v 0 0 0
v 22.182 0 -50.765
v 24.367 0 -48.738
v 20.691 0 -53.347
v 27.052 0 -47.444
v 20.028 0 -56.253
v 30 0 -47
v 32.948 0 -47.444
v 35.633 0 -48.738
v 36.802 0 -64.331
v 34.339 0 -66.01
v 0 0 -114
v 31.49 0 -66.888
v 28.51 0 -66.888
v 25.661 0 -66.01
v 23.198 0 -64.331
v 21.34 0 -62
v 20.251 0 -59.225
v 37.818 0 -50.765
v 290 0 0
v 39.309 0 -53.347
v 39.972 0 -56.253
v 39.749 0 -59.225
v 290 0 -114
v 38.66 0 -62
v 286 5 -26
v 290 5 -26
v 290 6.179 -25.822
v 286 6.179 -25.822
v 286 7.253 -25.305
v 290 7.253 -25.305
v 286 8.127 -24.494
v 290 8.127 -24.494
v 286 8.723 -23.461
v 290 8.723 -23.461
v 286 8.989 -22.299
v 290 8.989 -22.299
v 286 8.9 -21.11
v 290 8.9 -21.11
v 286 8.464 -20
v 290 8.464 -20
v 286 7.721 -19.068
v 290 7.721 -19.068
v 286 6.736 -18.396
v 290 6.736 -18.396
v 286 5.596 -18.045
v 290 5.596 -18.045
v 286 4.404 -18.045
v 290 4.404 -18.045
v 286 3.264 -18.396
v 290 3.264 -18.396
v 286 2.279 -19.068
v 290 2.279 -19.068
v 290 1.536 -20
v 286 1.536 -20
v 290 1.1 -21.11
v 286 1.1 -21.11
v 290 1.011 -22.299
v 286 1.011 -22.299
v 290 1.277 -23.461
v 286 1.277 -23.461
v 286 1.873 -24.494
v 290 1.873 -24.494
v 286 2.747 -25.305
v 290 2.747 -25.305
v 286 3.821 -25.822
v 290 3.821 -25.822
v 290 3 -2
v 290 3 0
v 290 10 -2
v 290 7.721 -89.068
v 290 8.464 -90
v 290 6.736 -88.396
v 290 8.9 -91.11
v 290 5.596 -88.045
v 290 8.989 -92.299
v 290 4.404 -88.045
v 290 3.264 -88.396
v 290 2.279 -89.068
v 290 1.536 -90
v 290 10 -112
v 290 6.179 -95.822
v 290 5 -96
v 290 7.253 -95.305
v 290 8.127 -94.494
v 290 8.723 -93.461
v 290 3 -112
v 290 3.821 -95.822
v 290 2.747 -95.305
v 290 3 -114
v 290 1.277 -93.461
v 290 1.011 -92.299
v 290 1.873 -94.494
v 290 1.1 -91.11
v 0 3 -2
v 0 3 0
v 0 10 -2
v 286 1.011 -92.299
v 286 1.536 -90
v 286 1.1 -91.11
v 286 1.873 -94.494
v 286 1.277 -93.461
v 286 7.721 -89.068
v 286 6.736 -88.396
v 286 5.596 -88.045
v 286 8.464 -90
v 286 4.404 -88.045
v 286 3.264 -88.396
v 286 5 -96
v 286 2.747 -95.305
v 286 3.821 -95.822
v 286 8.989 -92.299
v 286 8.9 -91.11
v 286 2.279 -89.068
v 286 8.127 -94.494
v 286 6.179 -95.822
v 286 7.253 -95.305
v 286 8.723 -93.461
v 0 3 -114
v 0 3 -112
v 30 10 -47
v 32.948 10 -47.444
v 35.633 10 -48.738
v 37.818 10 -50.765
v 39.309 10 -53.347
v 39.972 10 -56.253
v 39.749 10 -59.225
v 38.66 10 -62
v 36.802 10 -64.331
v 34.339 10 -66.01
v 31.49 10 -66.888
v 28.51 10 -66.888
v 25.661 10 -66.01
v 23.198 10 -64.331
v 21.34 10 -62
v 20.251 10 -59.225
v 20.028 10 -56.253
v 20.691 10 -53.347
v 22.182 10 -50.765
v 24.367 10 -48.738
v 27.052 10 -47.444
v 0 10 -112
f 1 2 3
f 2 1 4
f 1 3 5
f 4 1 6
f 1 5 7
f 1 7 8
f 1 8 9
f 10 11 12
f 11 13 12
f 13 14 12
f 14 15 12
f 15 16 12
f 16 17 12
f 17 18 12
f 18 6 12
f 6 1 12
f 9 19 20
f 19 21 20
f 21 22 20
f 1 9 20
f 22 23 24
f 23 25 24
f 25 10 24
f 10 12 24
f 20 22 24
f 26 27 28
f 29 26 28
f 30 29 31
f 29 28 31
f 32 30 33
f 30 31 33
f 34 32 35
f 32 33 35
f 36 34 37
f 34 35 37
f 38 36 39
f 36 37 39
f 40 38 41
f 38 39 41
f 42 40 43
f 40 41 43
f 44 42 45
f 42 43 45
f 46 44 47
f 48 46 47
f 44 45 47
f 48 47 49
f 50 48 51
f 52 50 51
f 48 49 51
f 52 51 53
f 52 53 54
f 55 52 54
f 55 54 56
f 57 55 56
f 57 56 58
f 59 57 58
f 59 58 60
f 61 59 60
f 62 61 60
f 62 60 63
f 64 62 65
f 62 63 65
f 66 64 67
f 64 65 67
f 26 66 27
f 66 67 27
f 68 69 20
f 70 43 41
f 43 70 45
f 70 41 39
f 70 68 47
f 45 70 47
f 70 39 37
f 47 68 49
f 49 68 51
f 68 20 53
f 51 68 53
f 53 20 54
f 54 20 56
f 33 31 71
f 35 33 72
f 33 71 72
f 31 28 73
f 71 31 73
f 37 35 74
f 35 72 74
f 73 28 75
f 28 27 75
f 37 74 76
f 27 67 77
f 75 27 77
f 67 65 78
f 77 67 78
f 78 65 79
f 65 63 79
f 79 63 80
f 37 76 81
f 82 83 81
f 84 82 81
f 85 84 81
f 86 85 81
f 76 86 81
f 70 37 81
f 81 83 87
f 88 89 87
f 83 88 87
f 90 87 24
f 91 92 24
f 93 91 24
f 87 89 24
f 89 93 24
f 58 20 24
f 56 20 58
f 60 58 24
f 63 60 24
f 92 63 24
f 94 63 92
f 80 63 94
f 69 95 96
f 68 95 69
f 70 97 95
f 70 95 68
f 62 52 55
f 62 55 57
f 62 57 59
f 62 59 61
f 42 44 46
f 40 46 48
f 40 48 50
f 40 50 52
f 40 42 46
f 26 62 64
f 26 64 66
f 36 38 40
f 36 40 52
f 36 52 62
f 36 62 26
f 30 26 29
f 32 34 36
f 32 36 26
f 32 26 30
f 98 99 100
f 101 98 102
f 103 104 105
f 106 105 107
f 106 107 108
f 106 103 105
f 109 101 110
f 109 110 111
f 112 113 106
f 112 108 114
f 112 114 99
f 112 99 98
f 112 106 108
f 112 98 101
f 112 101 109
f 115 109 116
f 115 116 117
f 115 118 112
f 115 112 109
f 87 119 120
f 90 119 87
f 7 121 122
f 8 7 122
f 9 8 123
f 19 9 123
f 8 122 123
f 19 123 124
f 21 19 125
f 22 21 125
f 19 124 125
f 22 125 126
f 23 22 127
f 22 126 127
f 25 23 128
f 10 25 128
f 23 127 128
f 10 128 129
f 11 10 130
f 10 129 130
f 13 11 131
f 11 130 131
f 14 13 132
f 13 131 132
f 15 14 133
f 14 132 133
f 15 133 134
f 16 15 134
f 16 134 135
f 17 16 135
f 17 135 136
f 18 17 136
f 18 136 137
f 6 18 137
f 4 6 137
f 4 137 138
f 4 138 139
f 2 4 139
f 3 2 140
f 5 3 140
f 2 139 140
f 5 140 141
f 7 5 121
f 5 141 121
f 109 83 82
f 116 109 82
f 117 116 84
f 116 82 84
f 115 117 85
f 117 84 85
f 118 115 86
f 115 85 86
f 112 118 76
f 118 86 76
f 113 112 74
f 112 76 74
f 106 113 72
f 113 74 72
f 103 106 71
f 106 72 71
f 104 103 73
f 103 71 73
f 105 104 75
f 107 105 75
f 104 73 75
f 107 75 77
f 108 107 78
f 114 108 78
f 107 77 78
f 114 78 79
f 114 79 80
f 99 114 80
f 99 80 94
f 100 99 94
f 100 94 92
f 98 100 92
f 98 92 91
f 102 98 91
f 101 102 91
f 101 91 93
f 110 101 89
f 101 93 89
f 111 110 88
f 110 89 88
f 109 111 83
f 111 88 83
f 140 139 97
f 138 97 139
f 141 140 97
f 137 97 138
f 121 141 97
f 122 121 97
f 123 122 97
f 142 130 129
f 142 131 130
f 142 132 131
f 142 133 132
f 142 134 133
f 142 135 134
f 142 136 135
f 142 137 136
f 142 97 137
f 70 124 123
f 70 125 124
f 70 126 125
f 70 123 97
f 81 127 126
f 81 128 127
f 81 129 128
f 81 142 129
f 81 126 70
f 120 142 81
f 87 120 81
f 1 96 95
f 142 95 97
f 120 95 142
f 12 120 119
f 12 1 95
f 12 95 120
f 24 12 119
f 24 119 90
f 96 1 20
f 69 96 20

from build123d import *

# Parameters (mm, degrees)
SKETCH1_W           = 290
SKETCH1_H           = 114
BOSS_EXTRUDE1_DEPTH = 10
SKETCH2_W           = 290
SKETCH2_H           = 2
CUT_EXTRUDE1_DEPTH  = 7
SKETCH3_R           = 4
CUT_EXTRUDE2_DEPTH  = 4
SKETCH4_R           = 10
CUT_EXTRUDE3_DEPTH  = 10


with BuildPart() as part:
    # Sketch1 → Boss-Extrude1 (new body)
    with BuildSketch(Plane(origin=(0, 0, 0), x_dir=(1, 0, 0), z_dir=(0, 1, 0))):
        with Locations((145, 57)):
            Rectangle(SKETCH1_W, SKETCH1_H)
    extrude(amount=BOSS_EXTRUDE1_DEPTH)

    # Sketch2 → Cut-Extrude1 (cut)
    with BuildSketch(Plane(origin=(0, 10, 0), x_dir=(1, 0, 0), z_dir=(0, 1, 0))):
        with Locations((145, 113)):
            Rectangle(SKETCH2_W, SKETCH2_H)
        with Locations((145, 1)):
            Rectangle(SKETCH2_W, SKETCH2_H)
    extrude(amount=-CUT_EXTRUDE1_DEPTH, mode=Mode.SUBTRACT)

    # Sketch3 → Cut-Extrude2 (cut)
    with BuildSketch(Plane(origin=(290, 0, 0), x_dir=(0, 0, -1), z_dir=(1, 0, 0))):
        with Locations((22, 5)):
            Circle(SKETCH3_R)
        with Locations((92, 5)):
            Circle(SKETCH3_R)
    extrude(amount=-CUT_EXTRUDE2_DEPTH, mode=Mode.SUBTRACT)

    # Sketch4 → Cut-Extrude3 (cut)
    with BuildSketch(Plane(origin=(0, 10, 0), x_dir=(1, 0, 0), z_dir=(0, 1, 0))):
        with Locations(Location((30, 57, 0), (0, 0, 270))):
            Circle(SKETCH4_R)
    extrude(amount=-CUT_EXTRUDE3_DEPTH, mode=Mode.SUBTRACT)


solid = part.part
